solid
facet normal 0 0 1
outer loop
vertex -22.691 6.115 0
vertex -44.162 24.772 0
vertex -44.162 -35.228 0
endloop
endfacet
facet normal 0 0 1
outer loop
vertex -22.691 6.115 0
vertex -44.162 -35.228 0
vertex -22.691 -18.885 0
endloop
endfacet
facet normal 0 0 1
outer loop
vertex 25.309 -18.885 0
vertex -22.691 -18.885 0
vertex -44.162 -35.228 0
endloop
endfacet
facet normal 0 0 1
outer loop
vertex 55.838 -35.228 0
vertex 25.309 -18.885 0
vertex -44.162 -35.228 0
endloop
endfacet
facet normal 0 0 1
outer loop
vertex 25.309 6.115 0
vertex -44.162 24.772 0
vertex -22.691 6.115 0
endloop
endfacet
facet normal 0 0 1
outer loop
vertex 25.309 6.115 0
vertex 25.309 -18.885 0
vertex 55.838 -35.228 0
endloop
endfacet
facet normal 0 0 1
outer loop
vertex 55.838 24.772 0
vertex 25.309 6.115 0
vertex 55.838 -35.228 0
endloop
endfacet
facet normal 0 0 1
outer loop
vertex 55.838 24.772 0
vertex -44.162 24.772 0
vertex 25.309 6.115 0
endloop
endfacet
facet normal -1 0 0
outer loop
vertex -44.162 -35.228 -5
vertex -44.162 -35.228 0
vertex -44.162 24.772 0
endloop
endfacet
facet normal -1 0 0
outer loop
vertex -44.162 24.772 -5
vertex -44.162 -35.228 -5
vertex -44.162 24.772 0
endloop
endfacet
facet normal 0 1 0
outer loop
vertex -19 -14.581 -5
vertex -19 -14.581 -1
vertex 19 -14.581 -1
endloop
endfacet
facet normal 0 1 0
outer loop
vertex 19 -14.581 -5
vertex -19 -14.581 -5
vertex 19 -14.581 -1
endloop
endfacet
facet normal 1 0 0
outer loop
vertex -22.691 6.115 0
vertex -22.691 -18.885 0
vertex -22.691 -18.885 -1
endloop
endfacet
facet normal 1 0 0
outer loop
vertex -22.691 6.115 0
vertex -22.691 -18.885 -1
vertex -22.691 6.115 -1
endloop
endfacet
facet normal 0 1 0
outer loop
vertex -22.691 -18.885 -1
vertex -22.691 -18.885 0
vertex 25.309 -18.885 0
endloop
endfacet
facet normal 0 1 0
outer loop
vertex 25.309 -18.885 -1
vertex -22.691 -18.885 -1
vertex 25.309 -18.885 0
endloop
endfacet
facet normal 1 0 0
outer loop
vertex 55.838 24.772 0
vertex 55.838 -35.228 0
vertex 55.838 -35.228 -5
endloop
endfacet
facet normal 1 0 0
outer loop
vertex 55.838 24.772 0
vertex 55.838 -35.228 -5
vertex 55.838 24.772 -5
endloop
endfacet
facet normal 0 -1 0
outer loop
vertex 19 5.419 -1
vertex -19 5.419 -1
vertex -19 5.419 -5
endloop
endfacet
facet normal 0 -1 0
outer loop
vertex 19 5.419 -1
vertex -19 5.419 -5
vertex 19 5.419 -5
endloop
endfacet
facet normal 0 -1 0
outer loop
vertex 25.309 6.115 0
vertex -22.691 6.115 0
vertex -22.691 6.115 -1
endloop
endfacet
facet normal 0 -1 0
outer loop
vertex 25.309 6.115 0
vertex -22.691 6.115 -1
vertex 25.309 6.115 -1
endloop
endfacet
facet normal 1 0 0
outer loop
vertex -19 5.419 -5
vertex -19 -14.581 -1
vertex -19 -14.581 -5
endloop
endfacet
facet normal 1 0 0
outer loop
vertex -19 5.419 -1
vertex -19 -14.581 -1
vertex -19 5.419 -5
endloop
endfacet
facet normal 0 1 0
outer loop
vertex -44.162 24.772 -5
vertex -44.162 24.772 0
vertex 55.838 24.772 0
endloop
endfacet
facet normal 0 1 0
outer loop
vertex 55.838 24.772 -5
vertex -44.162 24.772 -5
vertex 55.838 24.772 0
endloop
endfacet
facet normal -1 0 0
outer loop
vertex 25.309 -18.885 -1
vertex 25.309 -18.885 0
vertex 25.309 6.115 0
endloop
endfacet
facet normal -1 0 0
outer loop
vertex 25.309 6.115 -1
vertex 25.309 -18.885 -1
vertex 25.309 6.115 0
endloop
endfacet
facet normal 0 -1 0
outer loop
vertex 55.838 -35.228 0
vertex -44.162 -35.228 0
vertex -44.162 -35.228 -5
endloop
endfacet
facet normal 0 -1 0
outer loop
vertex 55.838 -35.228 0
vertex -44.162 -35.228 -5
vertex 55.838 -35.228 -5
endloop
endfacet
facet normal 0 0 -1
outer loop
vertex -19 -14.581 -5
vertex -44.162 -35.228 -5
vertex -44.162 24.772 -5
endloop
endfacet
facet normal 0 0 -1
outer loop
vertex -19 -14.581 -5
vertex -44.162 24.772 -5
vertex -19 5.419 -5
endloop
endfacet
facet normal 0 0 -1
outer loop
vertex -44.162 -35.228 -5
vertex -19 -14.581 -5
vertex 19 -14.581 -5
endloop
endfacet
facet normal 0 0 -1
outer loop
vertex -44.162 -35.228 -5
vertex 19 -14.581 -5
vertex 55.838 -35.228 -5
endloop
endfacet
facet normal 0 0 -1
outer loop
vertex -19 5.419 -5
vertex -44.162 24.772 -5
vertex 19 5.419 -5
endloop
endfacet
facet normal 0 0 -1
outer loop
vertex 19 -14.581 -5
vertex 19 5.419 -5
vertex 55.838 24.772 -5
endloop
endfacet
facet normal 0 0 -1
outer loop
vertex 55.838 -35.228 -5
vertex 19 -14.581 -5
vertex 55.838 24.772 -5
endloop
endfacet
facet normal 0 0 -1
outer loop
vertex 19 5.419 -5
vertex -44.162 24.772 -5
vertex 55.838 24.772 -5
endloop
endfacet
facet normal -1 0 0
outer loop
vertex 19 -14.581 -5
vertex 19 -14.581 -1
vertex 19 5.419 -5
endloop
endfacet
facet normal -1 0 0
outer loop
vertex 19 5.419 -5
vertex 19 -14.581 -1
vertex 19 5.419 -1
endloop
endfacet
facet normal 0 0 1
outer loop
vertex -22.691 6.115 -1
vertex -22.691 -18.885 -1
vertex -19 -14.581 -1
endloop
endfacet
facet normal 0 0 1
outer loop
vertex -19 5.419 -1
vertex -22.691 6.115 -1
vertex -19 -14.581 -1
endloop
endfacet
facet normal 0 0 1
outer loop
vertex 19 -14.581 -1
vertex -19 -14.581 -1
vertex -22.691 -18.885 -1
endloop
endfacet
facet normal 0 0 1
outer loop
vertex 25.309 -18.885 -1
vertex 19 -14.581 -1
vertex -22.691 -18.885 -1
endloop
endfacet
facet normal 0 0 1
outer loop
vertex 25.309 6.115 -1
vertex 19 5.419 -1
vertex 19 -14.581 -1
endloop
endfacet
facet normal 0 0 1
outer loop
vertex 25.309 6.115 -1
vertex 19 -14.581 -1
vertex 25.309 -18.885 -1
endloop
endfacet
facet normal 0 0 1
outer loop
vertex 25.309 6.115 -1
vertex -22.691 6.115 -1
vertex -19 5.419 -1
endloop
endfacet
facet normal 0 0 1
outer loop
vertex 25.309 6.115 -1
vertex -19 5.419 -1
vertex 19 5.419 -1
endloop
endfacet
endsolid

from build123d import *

# Parameters (mm, degrees)
F0_W     = 100
F0_H     = 60
F3_DEPTH = 5
F1_W     = 48
F1_H     = 25
F4_DEPTH = 1
F2_W     = 38
F2_H     = 20
F5_DEPTH = 10


with BuildPart() as f3:
    # F0 (on Top) → F3 (new body)
    with BuildSketch(Plane.XY):
        with Locations((5.838281, -5.227597)):
            Rectangle(F0_W, F0_H)
    extrude(amount=-F3_DEPTH)

    # F1 (on Top) → F4 (cut)
    with BuildSketch(Plane.XY):
        with Locations((1.309254, -6.3852)):
            Rectangle(F1_W, F1_H)
    extrude(amount=-F4_DEPTH, mode=Mode.SUBTRACT)

    # F2 (on face) → F5 (cut)
    with BuildSketch(Plane.XY):
        with Locations((0, -4.581108)):
            Rectangle(F2_W, F2_H)
    extrude(amount=-F5_DEPTH, mode=Mode.SUBTRACT)


solid = f3.part
